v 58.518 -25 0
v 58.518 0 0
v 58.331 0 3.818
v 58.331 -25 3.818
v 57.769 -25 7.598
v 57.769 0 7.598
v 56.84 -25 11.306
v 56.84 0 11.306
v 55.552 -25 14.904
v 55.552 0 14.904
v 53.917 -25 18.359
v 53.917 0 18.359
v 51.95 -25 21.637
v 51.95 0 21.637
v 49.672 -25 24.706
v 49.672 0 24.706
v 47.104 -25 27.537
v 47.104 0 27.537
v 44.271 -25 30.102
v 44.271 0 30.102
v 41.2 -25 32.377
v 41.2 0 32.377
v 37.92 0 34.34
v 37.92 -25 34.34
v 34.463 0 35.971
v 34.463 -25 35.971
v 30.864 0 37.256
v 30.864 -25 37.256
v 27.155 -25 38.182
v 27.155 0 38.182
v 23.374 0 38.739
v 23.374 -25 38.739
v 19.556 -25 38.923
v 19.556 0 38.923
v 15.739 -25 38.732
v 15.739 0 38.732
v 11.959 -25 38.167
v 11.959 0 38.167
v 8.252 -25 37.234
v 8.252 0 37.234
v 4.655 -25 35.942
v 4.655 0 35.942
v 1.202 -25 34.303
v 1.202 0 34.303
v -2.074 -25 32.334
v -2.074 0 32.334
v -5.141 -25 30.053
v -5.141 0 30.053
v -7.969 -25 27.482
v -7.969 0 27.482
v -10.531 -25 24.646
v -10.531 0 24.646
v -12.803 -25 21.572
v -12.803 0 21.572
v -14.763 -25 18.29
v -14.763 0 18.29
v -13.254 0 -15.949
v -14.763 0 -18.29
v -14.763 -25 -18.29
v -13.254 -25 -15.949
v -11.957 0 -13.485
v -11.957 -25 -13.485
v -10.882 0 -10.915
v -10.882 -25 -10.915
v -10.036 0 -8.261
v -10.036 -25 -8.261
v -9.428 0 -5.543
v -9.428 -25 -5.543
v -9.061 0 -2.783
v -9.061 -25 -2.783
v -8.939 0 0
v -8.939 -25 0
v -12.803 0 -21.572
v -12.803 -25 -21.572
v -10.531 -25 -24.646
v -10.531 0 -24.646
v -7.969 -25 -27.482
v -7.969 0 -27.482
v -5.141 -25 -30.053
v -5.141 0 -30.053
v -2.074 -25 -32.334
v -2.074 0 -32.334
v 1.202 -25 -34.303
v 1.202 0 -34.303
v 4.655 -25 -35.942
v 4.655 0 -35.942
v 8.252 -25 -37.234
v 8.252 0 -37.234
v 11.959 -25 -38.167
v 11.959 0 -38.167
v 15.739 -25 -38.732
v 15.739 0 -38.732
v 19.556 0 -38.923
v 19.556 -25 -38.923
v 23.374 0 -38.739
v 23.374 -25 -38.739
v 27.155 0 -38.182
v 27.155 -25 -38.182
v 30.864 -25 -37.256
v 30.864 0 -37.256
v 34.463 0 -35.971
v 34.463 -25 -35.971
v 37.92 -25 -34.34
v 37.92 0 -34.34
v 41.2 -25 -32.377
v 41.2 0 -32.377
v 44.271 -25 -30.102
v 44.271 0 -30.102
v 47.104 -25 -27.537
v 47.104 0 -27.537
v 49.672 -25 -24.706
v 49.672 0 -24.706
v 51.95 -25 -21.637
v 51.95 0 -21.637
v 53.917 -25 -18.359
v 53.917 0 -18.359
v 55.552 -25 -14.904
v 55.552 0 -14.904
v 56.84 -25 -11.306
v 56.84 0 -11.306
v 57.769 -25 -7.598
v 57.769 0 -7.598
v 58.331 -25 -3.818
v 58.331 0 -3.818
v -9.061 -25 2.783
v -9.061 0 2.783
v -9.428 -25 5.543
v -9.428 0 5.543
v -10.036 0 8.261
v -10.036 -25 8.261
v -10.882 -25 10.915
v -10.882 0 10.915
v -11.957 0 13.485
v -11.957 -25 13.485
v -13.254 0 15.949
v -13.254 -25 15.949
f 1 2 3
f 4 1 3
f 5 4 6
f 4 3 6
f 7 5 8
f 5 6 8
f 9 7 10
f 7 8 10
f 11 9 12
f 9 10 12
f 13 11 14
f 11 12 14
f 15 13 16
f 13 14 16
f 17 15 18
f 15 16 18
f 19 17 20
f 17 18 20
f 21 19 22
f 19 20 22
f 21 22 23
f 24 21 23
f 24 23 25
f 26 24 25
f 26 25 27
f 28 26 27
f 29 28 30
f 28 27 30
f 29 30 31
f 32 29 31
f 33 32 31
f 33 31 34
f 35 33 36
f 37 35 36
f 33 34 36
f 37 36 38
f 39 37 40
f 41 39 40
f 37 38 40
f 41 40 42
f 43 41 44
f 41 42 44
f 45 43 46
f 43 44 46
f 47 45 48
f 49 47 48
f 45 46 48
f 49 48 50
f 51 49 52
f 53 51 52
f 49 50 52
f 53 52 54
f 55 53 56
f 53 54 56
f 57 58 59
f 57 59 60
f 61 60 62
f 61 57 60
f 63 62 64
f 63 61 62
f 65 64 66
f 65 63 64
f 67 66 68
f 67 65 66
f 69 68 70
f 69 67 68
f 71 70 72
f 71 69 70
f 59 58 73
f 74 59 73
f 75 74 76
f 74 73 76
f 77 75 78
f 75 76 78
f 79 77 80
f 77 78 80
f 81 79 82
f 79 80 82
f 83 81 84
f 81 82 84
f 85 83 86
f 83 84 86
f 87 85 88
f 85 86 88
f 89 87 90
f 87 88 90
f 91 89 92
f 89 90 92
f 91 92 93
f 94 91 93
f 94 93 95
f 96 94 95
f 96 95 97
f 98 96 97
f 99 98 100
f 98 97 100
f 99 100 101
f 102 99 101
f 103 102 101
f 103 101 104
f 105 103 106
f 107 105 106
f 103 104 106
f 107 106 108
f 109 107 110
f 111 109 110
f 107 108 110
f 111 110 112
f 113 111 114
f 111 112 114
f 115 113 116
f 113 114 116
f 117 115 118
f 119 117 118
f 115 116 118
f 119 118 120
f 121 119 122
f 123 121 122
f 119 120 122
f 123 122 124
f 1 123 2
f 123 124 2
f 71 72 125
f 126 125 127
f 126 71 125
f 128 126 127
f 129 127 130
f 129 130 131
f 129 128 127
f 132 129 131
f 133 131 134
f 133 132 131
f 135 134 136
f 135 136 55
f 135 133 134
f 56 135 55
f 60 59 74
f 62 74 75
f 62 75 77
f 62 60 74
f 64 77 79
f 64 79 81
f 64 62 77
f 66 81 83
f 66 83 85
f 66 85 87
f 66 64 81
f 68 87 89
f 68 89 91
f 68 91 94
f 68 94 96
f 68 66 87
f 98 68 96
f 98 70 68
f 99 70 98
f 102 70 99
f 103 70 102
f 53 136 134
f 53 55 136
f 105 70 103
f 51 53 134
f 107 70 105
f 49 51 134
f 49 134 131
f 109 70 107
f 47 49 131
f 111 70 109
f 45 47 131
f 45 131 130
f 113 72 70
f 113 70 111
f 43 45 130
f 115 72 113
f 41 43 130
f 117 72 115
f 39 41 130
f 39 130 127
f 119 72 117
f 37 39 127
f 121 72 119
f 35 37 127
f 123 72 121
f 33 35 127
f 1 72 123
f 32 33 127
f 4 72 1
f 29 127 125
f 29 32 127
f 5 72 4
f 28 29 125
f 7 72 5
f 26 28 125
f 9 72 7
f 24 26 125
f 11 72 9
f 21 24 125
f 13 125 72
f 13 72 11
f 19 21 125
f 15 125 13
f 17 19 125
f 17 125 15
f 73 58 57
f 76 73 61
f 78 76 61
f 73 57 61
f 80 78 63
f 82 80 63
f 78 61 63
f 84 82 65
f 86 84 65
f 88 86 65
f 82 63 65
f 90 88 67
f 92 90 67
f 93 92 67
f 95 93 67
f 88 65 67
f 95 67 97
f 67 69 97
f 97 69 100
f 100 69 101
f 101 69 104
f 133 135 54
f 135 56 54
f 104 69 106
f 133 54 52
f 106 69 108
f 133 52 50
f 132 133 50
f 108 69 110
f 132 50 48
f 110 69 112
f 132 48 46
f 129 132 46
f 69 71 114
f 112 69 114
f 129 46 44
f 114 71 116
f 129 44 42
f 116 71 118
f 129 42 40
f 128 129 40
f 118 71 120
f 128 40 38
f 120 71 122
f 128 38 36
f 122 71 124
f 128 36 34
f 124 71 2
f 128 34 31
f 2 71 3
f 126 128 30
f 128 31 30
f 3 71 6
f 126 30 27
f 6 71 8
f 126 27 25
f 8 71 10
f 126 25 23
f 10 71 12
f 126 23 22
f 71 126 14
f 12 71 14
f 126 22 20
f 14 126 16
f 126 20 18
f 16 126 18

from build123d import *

# Parameters (mm, degrees)
F1_DEPTH = 25
F2_DEPTH = 25


with BuildPart() as f1:
    # F0 (on Front) → F1 (new body)
    with BuildSketch(Plane.XZ):
        with BuildLine():
            ThreePointArc((-14.762832, -18.290401), (-19.327975, 0), (-14.762832, 18.290401))
            ThreePointArc((-14.762832, 18.290401), (-72.201915, 0), (-14.762832, -18.290401))
        make_face()
        with BuildLine():
            ThreePointArc((-14.762832, -18.290401), (-10.429805, -9.597663), (-8.938596, 0))
            ThreePointArc((-8.938596, 0), (-10.429805, 9.597663), (-14.762832, 18.290401))
            ThreePointArc((-14.762832, 18.290401), (-19.327975, 0), (-14.762832, -18.290401))
        make_face()
    extrude(amount=F1_DEPTH)


with BuildPart() as f2:
    # F0 (on Front) → F2 (new body)
    with BuildSketch(Plane.XZ):
        with BuildLine():
            ThreePointArc((-14.762832, 18.290401), (-10.429805, 9.597663), (-8.938596, 0))
            ThreePointArc((-8.938596, 0), (-10.429805, -9.597663), (-14.762832, -18.290401))
            ThreePointArc((-14.762832, -18.290401), (29.020914, -37.764609), (58.518297, 0))
            ThreePointArc((58.518297, 0), (29.020914, 37.764609), (-14.762832, 18.290401))
        make_face()
        with BuildLine():
            ThreePointArc((-14.762832, -18.290401), (-10.429805, -9.597663), (-8.938596, 0))
            ThreePointArc((-8.938596, 0), (-10.429805, 9.597663), (-14.762832, 18.290401))
            ThreePointArc((-14.762832, 18.290401), (-19.327975, 0), (-14.762832, -18.290401))
        make_face()
    extrude(amount=F2_DEPTH)

    # F3: cut F1
    add(f1.part, mode=Mode.SUBTRACT)


solid = f2.part
